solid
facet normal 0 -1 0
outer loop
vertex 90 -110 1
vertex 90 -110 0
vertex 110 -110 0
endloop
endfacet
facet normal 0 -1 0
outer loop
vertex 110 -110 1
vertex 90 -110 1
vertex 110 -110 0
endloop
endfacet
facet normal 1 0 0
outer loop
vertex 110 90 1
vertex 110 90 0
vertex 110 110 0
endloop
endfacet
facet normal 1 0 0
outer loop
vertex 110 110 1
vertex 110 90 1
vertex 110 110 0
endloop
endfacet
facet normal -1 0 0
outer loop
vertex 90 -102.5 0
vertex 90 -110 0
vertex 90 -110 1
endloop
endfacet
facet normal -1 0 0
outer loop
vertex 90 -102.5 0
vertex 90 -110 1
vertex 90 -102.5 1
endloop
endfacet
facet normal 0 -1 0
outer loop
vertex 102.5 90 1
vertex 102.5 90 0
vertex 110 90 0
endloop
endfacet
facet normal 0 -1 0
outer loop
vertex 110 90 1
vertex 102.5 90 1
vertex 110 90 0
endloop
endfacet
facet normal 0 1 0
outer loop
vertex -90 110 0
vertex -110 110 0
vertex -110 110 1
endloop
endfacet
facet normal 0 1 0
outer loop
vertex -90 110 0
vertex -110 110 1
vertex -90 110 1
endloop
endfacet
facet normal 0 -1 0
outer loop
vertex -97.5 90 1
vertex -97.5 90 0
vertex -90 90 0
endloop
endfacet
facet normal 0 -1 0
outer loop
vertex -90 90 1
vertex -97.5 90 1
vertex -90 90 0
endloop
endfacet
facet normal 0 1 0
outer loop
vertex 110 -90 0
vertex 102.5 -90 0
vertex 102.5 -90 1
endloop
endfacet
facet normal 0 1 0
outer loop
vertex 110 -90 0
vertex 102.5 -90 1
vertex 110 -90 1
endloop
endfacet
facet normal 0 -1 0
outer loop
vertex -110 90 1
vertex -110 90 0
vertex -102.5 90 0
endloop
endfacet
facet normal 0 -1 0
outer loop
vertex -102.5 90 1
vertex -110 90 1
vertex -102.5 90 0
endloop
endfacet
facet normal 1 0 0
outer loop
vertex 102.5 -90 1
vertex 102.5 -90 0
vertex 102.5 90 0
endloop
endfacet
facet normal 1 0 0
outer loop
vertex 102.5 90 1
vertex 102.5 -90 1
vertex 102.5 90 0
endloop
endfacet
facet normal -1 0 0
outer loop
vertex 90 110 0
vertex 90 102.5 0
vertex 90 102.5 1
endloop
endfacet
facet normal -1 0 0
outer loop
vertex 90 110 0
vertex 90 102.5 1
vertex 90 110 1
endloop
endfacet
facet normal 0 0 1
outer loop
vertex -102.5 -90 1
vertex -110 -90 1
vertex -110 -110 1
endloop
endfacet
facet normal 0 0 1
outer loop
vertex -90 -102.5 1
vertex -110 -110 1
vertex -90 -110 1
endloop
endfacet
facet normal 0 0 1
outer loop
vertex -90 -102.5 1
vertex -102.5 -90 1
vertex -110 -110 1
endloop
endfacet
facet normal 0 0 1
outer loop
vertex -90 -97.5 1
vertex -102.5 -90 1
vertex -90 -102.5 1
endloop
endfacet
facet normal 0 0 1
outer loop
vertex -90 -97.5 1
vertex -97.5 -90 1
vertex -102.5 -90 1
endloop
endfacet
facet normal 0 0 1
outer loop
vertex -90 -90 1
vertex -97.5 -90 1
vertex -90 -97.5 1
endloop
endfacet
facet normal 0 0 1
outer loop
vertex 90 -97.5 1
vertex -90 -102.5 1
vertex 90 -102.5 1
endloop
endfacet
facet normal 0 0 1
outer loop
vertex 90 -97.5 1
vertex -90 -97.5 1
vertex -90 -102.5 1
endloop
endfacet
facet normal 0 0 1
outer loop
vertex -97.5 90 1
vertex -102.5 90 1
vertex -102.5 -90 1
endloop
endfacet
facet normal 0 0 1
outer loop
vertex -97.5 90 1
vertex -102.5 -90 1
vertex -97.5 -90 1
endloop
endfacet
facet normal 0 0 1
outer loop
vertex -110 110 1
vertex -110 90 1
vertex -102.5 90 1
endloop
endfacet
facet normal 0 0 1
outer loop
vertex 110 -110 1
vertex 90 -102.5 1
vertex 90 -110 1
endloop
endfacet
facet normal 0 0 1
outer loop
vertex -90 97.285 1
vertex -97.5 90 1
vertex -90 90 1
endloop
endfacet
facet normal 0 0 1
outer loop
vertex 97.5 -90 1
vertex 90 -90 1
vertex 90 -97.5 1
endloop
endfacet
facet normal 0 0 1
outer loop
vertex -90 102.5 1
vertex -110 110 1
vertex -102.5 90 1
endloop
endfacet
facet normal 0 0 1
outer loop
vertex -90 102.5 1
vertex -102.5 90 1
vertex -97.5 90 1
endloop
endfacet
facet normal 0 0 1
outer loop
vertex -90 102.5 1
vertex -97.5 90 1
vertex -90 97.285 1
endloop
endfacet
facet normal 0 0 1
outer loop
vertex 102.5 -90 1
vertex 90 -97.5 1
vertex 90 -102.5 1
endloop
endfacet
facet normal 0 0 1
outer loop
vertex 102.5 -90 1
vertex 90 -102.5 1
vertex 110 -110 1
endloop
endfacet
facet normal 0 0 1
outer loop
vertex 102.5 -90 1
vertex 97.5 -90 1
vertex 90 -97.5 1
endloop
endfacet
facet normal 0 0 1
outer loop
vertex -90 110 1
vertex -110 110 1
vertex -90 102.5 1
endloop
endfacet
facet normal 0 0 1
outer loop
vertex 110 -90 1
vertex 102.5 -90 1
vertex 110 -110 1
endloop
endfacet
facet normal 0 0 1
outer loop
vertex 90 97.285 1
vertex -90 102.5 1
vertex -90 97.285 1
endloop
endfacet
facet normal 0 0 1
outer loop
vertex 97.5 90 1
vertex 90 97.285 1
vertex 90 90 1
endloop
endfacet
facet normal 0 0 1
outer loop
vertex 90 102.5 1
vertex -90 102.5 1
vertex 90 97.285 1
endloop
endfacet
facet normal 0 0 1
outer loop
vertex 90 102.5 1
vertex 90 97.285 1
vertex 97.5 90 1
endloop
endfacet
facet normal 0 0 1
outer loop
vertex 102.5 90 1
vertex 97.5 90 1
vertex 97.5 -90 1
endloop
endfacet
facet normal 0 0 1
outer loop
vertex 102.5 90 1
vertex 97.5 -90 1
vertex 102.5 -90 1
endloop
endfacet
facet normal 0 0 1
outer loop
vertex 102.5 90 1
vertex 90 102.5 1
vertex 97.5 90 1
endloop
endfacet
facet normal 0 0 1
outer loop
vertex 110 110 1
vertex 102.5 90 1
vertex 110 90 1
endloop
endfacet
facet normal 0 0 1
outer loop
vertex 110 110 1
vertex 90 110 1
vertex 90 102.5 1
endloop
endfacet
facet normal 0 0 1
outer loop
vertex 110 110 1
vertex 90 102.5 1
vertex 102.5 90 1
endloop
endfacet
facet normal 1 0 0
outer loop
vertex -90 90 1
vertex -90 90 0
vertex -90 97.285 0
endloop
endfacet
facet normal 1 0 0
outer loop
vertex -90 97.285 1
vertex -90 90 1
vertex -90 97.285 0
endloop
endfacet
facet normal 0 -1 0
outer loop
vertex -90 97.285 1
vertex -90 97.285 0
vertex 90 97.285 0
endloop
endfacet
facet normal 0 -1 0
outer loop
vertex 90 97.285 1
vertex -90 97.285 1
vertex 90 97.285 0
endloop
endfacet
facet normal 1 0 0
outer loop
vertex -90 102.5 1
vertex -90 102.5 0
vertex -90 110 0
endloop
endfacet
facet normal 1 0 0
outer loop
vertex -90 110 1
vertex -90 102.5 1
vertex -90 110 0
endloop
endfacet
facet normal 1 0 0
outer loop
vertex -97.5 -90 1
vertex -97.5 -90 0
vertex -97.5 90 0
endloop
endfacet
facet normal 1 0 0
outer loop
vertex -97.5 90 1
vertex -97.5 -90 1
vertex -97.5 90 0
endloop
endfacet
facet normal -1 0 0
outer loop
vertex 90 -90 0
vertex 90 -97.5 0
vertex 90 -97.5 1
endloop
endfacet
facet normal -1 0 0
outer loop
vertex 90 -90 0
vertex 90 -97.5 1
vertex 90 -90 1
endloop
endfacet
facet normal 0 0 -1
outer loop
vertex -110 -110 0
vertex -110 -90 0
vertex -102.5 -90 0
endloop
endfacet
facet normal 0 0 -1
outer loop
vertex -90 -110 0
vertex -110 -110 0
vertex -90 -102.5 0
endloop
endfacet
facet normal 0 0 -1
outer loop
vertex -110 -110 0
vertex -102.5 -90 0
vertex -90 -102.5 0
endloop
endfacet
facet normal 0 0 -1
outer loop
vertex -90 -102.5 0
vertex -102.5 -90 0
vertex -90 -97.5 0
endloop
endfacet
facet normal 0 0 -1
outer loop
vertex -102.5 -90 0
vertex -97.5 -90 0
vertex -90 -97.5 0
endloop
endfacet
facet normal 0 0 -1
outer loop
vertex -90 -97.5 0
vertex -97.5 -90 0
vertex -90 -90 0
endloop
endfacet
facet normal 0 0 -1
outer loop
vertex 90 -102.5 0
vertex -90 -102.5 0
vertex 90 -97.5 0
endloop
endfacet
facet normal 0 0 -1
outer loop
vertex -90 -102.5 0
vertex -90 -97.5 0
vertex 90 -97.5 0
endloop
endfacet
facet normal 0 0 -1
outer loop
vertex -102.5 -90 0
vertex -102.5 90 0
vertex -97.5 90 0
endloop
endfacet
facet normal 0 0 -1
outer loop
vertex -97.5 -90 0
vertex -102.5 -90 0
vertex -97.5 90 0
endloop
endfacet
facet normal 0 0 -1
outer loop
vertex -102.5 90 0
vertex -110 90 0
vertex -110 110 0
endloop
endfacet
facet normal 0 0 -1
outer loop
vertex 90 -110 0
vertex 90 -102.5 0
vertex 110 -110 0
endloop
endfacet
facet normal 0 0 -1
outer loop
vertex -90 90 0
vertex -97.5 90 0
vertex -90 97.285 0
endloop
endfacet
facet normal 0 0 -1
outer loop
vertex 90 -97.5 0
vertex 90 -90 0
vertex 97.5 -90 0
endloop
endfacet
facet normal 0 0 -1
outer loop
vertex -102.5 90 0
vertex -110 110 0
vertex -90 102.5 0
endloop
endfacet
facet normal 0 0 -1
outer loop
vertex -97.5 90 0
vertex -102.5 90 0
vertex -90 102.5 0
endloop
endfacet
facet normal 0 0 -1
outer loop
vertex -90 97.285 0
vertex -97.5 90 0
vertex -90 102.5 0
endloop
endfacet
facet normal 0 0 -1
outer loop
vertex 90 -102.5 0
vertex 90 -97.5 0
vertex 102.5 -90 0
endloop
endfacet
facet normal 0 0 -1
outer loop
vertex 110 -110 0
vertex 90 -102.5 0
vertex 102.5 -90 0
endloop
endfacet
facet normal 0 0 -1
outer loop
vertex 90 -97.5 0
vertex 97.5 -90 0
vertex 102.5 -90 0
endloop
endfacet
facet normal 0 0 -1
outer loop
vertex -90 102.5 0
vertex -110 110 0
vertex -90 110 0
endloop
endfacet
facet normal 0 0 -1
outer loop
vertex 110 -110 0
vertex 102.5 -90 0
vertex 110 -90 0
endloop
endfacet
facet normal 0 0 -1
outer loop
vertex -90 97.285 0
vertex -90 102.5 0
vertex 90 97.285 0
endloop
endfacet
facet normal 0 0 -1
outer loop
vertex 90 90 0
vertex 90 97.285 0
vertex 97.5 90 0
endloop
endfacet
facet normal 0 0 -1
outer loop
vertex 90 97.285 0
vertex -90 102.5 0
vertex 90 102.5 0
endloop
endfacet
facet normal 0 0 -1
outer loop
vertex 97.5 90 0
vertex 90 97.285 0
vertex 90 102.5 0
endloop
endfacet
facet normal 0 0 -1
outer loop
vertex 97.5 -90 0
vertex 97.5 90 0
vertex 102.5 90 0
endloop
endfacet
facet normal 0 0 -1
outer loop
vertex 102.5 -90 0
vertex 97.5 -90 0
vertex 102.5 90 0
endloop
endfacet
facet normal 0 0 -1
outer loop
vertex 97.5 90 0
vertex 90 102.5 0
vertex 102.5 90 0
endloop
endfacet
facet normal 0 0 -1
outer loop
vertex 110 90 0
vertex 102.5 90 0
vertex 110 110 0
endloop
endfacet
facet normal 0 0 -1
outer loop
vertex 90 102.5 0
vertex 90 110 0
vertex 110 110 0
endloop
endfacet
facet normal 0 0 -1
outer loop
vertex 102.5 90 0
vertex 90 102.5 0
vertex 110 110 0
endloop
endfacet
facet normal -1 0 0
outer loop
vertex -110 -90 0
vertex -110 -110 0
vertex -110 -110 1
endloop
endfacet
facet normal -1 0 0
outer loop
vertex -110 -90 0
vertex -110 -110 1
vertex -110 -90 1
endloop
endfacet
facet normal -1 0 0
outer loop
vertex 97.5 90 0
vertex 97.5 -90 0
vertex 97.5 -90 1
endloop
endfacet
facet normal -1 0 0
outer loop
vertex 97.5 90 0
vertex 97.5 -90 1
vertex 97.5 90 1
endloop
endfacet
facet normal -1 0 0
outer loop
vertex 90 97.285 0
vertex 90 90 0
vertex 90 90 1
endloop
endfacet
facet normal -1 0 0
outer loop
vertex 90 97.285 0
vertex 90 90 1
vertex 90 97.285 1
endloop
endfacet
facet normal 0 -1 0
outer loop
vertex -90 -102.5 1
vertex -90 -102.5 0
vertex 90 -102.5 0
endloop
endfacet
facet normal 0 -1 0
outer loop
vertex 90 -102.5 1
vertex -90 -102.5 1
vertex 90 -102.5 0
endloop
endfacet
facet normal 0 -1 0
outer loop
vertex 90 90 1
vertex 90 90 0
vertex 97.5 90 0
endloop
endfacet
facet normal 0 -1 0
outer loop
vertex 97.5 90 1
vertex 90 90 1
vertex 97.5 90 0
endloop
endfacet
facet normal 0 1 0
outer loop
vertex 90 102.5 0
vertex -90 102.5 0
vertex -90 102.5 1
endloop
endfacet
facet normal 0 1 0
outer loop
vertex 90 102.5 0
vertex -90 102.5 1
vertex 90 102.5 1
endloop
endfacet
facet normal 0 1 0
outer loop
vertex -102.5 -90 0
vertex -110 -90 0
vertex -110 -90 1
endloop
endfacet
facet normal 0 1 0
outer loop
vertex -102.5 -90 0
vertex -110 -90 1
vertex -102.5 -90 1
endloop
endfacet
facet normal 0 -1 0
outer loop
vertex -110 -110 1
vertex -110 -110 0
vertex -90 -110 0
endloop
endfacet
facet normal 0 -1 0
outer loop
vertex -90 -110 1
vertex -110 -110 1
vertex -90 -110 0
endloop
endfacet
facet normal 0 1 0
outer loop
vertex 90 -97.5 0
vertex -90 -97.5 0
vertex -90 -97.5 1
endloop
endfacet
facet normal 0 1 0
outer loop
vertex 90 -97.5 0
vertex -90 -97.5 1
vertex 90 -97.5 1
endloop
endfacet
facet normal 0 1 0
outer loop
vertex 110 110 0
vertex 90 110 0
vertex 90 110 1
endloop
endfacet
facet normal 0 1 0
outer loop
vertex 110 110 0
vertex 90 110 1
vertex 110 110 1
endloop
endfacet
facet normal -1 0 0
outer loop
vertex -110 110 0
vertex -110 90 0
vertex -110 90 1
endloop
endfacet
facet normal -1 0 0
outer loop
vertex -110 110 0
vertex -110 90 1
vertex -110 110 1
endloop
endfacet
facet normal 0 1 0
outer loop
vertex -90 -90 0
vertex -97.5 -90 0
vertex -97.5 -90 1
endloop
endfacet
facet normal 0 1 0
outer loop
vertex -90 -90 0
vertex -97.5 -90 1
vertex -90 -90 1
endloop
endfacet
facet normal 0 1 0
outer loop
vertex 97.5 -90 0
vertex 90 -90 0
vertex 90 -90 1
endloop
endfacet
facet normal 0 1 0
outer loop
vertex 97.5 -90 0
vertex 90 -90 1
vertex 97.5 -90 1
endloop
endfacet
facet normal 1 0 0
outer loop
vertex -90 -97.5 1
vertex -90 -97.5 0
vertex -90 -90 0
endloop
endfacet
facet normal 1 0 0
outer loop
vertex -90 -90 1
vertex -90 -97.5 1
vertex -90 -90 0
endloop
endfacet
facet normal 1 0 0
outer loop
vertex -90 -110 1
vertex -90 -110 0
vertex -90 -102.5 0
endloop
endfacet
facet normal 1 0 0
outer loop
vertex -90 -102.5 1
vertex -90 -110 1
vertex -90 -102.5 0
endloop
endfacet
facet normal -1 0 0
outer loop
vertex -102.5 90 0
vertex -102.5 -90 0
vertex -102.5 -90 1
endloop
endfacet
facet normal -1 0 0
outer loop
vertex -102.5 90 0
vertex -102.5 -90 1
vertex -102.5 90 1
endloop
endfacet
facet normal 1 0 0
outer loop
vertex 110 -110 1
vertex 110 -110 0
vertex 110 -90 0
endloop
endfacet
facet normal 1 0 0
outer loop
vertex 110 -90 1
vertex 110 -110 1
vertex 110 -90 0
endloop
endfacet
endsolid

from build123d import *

# Parameters (mm, degrees)
SKETCH_W   = 20
SKETCH_H   = 20
SKETCH_W_2 = 180
SKETCH_H_2 = 5.214788
SKETCH_W_3 = 5
SKETCH_H_3 = 180
SKETCH_H_4 = 5
PAD_DEPTH  = 1


with BuildPart() as part:
    # Sketch (on XY_Plane of Origin) → Pad (new body)
    with BuildSketch(Plane.XY):
        with Locations((-100, 100)):
            Rectangle(SKETCH_W, SKETCH_H)
        with Locations((-100, -100)):
            Rectangle(SKETCH_W, SKETCH_H)
        with Locations((100, -100)):
            Rectangle(SKETCH_W, SKETCH_H)
        with Locations((100, 100)):
            Rectangle(SKETCH_W, SKETCH_H)
        with Locations((0, 99.892606)):
            Rectangle(SKETCH_W_2, SKETCH_H_2)
        with Locations((-100, 0)):
            Rectangle(SKETCH_W_3, SKETCH_H_3)
        with Locations((0, -100)):
            Rectangle(SKETCH_W_2, SKETCH_H_4)
        with Locations((100, 0)):
            Rectangle(SKETCH_W_3, SKETCH_H_3)
    extrude(amount=PAD_DEPTH)


solid = part.part
